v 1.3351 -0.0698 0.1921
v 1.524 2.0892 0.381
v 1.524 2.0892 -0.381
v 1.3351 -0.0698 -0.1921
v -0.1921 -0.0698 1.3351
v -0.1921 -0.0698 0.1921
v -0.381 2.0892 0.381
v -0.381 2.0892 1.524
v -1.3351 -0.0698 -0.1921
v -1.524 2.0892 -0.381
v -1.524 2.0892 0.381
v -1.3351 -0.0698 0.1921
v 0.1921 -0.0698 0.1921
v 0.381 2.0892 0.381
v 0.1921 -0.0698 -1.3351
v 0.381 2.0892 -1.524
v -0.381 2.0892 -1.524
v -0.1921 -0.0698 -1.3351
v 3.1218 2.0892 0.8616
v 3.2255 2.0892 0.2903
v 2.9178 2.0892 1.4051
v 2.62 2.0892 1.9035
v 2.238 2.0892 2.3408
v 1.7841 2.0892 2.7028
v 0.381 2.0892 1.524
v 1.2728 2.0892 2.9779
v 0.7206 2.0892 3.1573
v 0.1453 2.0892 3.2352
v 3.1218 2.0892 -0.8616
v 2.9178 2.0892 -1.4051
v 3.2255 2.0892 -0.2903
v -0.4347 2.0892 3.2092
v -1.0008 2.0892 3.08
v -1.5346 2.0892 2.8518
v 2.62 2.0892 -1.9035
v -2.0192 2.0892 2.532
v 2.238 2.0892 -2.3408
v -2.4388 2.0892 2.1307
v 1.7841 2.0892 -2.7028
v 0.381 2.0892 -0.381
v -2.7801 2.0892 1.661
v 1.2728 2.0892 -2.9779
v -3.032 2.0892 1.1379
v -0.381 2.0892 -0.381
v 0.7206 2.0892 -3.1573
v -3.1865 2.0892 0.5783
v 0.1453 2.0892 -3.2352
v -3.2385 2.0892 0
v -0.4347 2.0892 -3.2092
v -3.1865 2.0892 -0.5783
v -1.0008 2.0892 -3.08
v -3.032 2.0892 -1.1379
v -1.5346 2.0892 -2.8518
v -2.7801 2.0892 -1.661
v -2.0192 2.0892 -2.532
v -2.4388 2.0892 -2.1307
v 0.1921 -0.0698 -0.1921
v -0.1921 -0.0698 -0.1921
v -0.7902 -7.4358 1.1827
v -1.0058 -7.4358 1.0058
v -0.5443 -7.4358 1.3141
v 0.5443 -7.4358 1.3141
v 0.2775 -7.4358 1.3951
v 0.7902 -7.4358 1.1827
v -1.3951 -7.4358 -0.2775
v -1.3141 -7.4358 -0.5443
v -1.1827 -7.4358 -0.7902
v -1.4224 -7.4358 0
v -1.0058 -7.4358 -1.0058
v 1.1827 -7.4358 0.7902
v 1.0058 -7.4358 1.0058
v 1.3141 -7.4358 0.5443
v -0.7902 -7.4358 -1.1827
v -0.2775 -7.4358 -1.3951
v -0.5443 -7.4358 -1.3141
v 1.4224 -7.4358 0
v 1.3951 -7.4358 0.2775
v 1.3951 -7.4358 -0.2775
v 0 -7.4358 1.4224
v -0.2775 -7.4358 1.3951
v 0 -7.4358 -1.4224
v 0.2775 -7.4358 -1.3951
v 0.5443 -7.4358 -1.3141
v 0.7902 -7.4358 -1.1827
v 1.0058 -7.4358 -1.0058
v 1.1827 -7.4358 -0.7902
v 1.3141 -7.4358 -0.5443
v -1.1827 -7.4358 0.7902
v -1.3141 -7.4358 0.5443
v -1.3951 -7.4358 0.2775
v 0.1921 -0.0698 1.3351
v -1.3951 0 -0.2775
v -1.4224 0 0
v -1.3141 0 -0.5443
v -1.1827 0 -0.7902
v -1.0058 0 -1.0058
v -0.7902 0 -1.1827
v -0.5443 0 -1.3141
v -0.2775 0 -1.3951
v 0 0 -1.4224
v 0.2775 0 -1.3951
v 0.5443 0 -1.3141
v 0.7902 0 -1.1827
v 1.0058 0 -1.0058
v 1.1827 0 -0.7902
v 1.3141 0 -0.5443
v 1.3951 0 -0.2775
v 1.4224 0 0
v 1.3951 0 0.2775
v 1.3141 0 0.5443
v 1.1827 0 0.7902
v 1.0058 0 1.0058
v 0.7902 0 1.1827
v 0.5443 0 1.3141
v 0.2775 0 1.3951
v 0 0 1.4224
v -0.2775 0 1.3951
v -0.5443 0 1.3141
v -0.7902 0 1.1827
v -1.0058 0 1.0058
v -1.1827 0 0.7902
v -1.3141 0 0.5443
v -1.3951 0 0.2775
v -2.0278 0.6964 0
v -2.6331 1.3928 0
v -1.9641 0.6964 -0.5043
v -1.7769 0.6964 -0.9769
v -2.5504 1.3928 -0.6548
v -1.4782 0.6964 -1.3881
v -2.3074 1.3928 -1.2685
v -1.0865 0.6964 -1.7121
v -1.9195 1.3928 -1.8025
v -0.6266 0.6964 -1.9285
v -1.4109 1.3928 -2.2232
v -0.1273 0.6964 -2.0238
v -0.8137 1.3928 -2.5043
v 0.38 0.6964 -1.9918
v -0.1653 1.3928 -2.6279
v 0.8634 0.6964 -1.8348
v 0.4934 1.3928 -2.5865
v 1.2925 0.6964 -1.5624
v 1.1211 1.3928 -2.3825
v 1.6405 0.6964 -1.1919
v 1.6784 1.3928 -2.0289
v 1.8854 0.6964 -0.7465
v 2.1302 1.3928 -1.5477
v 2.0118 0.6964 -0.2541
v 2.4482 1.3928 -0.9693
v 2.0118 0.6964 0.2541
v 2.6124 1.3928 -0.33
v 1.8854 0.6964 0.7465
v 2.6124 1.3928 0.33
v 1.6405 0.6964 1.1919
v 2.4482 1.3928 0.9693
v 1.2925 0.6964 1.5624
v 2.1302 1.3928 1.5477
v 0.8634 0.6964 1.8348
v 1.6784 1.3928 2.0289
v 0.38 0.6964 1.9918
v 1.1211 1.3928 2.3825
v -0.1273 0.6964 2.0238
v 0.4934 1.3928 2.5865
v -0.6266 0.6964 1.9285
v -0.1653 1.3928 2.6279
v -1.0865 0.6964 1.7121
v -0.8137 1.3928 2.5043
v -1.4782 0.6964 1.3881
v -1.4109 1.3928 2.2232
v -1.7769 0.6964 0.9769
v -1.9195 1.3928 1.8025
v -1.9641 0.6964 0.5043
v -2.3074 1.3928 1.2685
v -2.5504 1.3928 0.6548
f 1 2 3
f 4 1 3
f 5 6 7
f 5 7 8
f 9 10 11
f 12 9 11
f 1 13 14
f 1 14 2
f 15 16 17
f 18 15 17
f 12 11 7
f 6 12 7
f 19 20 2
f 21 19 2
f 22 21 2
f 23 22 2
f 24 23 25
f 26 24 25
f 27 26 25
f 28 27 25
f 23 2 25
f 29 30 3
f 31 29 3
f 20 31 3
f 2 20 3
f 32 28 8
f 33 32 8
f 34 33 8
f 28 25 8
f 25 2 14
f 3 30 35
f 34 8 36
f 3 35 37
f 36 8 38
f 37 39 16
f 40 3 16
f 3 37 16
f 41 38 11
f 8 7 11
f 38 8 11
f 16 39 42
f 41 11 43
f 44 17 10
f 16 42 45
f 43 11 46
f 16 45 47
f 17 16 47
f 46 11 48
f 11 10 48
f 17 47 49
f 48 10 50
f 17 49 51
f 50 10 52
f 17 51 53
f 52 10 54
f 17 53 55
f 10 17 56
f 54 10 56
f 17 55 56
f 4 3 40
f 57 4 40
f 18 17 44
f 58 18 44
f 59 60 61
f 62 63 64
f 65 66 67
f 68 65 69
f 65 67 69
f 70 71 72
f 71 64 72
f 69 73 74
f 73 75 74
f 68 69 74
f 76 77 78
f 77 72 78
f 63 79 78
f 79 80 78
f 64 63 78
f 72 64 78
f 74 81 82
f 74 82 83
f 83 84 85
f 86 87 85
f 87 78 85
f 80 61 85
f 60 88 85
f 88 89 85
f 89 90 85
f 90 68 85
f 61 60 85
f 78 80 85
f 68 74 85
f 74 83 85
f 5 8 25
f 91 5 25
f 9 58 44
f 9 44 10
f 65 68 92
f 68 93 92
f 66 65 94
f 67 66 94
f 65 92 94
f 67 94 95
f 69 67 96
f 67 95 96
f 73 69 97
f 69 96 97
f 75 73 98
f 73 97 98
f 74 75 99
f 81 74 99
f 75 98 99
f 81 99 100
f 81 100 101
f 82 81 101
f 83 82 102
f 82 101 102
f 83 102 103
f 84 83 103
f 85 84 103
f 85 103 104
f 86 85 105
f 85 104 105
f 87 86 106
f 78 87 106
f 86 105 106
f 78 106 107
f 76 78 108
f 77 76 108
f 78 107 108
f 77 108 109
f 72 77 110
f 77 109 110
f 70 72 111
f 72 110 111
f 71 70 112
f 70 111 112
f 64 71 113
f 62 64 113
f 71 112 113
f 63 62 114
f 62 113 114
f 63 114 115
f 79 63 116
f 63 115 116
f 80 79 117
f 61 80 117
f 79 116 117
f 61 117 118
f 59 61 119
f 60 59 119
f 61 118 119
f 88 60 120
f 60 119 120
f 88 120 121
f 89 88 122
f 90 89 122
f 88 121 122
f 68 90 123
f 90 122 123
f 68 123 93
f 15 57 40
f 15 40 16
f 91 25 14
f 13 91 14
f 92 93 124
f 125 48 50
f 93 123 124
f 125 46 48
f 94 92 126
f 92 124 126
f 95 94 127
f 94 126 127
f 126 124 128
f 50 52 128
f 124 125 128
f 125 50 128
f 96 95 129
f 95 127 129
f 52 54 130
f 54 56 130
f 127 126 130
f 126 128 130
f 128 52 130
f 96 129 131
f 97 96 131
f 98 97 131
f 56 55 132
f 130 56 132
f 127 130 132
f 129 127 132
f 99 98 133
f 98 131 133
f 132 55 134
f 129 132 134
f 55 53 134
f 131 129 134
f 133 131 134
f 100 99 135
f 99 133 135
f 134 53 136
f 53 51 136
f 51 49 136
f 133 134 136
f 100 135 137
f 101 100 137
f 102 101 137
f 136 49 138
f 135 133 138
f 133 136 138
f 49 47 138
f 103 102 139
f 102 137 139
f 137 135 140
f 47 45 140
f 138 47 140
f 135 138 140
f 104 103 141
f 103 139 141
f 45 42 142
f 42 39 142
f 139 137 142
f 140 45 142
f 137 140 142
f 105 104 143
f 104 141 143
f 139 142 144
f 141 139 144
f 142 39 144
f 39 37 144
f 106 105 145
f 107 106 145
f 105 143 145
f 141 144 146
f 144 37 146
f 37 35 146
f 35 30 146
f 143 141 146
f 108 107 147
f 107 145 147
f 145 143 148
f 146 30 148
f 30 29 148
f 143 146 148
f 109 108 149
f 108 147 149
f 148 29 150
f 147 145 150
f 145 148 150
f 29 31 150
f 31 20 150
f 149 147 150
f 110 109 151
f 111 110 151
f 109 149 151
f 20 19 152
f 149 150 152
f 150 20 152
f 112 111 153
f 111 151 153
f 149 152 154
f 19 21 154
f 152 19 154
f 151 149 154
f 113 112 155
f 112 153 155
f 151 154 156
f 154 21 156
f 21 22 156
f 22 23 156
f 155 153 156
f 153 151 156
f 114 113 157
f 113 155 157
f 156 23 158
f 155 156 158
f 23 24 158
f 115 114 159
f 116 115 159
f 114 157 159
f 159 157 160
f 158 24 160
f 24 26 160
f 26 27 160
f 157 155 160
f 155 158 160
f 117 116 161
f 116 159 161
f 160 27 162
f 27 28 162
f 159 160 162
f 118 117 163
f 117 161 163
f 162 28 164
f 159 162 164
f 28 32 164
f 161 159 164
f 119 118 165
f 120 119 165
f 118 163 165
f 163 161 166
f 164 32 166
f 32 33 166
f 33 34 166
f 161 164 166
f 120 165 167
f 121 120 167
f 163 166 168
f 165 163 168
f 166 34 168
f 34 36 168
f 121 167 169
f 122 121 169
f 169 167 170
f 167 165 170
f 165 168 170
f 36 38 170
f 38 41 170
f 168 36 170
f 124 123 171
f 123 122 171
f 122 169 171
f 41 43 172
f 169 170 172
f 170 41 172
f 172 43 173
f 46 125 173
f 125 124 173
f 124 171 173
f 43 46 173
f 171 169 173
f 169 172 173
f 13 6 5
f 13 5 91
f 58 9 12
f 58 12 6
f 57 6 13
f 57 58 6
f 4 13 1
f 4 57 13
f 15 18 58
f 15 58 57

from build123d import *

# Parameters (mm, degrees)
CUT_EXTRUDE1_DEPTH = 2.159
CUT_EXTRUDE1_DRAFT = -5


with BuildPart() as part:
    # Sketch1 → Revolve1 (revolve)
    with BuildSketch(Plane.XY, mode=Mode.PRIVATE) as revolve1_sk:
        Polygon((1.4224, 0), (3.2385, 2.089184064), (0, 2.089184064), (0, 0), (0, -7.435815936), (1.4224, -7.435815936), align=None)
    revolve(revolve1_sk.sketch.rotate(Axis((0, 0, 0), (0, -1, 0)), 180), axis=Axis((0, 0, 0), (0, -1, 0)))


with BuildPart() as cut_extrude1_tool:
    # Sketch2 → Cut-Extrude1 (with draft: the straight prism first)
    with BuildSketch(Plane(origin=(0, 2.089184064, 0), x_dir=(1, 0, 0), z_dir=(0, 1, 0))):
        Polygon((-0.381, 1.524), (-0.381, 0.381), (-1.524, 0.381), (-1.524, -0.381), (-0.381, -0.381), (-0.381, -1.524), (0.381, -1.524), (0.381, -0.381), (1.524, -0.381), (1.524, 0.381), (0.381, 0.381), (0.381, 1.524), align=None)
    extrude(amount=-CUT_EXTRUDE1_DEPTH)
    # Cut-Extrude1: the draft: its side faces are tilted about the plane it starts from
    cut_extrude1_sides = [cut_extrude1_tool.faces().sort_by_distance(p)[0] for p in [
        (-0.381, 1.009684064, -0.9525),
        (-0.9525, 1.009684064, -0.381),
        (-1.524, 1.009684064, 0),
        (-0.9525, 1.009684064, 0.381),
        (-0.381, 1.009684064, 0.9525),
        (0, 1.009684064, 1.524),
        (0.381, 1.009684064, 0.9525),
        (0.9525, 1.009684064, 0.381),
        (1.524, 1.009684064, 0),
        (0.9525, 1.009684064, -0.381),
        (0.381, 1.009684064, -0.9525),
        (0, 1.009684064, -1.524),
    ]]
    draft(cut_extrude1_sides, Plane(origin=(0, 2.089184064, 0), x_dir=(1, 0, 0), z_dir=(0, 1, 0)), CUT_EXTRUDE1_DRAFT)


with BuildPart() as part_1:
    add(part.part)

    # Cut-Extrude1: cut by cut_extrude1_tool
    add(cut_extrude1_tool.part, mode=Mode.SUBTRACT)


solid = part_1.part
